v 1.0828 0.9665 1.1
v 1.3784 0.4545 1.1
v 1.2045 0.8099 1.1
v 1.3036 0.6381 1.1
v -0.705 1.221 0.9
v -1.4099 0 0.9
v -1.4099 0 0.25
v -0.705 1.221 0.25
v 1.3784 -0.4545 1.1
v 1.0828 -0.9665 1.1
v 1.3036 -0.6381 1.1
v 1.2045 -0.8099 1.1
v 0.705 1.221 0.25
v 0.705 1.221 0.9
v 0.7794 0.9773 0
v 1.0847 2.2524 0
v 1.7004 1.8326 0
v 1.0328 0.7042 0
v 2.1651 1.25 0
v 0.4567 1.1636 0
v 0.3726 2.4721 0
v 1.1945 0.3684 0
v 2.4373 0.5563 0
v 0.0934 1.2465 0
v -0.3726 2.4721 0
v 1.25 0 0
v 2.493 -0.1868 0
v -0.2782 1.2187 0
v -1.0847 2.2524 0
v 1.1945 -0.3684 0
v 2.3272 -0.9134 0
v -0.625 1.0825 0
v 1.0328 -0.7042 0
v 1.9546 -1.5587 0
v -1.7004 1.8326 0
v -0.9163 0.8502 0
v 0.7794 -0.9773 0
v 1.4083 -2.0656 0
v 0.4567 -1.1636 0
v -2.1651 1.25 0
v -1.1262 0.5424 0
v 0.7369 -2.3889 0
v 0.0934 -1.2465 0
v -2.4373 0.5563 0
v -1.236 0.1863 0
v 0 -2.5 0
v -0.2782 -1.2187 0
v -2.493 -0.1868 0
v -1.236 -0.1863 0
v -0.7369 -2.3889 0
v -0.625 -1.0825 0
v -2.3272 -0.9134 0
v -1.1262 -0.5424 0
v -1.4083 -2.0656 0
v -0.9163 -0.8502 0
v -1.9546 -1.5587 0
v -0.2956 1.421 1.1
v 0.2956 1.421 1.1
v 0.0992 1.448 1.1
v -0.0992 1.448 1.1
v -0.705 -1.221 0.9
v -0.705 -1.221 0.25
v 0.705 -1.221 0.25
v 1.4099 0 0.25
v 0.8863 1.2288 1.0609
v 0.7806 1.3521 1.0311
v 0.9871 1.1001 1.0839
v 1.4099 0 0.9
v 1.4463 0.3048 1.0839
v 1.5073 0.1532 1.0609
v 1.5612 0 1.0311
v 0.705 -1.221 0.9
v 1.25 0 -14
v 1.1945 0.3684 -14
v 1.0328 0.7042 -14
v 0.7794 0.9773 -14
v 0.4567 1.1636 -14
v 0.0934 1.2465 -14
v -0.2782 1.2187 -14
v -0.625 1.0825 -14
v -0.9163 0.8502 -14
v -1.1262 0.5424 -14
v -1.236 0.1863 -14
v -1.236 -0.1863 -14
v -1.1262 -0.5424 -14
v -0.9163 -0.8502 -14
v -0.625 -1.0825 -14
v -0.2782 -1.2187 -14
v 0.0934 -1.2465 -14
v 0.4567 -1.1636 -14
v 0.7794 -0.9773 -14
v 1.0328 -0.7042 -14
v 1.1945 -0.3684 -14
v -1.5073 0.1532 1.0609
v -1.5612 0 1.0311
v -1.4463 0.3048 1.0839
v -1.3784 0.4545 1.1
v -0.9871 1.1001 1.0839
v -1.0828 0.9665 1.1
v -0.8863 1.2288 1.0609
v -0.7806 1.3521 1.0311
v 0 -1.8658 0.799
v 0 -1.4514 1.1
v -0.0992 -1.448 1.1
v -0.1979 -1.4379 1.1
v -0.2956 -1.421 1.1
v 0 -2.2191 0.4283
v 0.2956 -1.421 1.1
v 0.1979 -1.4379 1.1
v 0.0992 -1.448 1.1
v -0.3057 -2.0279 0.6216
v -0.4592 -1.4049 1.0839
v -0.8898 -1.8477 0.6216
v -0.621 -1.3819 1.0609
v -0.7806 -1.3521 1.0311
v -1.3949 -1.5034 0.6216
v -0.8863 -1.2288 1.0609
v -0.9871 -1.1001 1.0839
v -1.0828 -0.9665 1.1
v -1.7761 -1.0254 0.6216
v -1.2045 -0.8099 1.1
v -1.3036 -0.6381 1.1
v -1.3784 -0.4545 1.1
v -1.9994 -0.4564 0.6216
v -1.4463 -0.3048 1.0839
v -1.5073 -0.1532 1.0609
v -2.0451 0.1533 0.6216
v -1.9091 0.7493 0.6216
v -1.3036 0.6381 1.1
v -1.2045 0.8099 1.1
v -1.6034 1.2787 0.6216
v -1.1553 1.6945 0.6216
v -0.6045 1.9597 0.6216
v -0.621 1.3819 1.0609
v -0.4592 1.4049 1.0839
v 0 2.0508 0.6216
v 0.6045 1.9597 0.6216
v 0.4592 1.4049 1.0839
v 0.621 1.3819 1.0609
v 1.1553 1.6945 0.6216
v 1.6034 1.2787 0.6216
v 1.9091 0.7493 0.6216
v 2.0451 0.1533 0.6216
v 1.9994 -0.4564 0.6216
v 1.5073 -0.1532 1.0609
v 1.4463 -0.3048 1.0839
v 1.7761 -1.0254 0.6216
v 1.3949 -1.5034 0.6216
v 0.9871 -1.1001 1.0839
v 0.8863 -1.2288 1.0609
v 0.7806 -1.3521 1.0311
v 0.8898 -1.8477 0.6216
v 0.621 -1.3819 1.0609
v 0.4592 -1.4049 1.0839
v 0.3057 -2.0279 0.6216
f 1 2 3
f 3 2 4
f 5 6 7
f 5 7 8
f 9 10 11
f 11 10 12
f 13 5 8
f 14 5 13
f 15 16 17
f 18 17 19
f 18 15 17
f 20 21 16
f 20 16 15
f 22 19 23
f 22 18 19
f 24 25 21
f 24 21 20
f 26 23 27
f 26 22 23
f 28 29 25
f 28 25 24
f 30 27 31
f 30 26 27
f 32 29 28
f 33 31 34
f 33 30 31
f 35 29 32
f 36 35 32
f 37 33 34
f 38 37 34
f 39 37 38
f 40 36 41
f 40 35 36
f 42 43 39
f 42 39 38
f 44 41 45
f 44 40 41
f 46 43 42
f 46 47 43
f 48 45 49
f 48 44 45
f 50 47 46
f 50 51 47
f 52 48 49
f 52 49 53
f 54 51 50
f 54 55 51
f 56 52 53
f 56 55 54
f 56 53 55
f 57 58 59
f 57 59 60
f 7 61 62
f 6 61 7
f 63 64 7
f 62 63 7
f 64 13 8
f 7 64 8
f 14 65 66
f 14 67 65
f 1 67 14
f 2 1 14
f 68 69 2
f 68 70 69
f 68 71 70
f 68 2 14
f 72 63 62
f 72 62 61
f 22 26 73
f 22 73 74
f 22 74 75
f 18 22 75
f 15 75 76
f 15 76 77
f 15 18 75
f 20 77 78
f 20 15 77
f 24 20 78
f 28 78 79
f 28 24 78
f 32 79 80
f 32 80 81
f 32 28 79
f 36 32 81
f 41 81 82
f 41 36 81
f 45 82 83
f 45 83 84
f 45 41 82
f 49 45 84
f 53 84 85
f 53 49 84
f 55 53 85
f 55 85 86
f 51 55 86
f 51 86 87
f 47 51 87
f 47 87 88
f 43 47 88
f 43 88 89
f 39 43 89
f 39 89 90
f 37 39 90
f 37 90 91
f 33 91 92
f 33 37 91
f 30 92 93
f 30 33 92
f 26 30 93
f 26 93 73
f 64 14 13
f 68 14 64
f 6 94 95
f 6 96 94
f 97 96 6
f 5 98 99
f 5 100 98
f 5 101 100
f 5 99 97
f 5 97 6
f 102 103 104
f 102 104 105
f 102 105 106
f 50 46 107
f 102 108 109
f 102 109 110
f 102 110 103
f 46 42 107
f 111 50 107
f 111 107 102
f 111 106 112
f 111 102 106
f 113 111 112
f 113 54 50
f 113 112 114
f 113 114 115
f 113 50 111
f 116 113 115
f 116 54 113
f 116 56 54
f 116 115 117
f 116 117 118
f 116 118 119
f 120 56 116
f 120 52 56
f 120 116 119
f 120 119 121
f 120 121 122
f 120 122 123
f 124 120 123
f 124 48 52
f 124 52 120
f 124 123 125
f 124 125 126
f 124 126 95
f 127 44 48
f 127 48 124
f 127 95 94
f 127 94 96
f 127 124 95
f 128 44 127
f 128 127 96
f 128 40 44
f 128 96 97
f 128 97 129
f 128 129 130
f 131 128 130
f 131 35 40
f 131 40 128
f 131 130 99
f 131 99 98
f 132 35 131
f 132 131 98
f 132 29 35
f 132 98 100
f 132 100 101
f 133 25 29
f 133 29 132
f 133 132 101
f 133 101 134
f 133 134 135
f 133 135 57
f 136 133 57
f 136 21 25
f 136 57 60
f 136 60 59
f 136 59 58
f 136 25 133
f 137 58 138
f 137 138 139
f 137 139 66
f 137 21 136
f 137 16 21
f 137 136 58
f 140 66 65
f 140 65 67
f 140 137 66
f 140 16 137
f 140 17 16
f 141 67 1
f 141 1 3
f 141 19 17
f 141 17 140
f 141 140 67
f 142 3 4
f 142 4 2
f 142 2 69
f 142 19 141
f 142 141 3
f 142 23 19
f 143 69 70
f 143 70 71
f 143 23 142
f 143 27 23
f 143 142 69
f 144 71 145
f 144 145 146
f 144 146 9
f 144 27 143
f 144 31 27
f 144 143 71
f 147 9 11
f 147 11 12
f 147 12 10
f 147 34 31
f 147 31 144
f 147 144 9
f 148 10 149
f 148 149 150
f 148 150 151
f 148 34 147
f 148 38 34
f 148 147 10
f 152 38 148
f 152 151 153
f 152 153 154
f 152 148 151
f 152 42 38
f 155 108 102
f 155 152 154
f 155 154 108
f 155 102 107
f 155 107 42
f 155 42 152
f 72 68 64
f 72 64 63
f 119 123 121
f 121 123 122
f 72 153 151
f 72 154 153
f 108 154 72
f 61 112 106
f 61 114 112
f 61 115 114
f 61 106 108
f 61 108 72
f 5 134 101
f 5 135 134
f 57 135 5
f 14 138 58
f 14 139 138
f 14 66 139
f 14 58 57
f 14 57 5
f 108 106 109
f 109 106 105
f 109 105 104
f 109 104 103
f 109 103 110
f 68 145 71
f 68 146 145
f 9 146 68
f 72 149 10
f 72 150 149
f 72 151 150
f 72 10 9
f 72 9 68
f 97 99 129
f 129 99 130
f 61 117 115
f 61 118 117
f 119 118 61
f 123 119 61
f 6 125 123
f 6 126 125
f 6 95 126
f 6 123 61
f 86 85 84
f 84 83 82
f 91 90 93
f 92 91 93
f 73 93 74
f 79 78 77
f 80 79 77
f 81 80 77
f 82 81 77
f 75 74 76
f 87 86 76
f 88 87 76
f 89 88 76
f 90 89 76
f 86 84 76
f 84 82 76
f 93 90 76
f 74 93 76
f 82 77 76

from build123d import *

# Parameters (mm, degrees)
SKETCH1_R               = 1.25
BOSS_EXTRUDE1_DEPTH     = 14
CUT_EXTRUDE1_DEPTH      = 1.25
CUT_EXTRUDE2_DEPTH      = 15.439529078
CUT_EXTRUDE2_DEPTH_BACK = 15.439529078
SKETCH6_W               = 1.249656436
SKETCH6_H               = 4.384153796
CHAMFER2_SIZE           = 0.2


with BuildPart() as part:
    # Sketch1 → Boss-Extrude1 (new body)
    with BuildSketch(Plane.XY):
        Circle(SKETCH1_R)
    extrude(amount=-BOSS_EXTRUDE1_DEPTH)

    # Sketch3 → Revolve1 (revolve)
    with BuildSketch(Plane(origin=(0, 0, 0), x_dir=(0, 0, -1), z_dir=(1, 0, 0)), mode=Mode.PRIVATE) as revolve1_sk:
        with BuildLine():
            ThreePointArc((-1.5, 0), (-1.096229956, 1.457737974), (0, 2.5))
            Line((0, 2.5), (0, 0))
            Line((0, 0), (-1.5, 0))
        make_face()
    revolve(revolve1_sk.sketch.rotate(Axis((0, 0, 1.5), (0, 0, -1)), 180), axis=Axis((0, 0, 1.5), (0, 0, -1)))

    # Sketch5 → Cut-Extrude1 (cut)
    with BuildSketch(Plane(origin=(0, 0, 1.5), x_dir=(-1, 0, 0), z_dir=(0, 0, -1))):
        Polygon((-1.409901945, 0), (-0.704950973, -1.221010901), (0.704950973, -1.221010901), (1.409901945, 0), (0.704950973, 1.221010901), (-0.704950973, 1.221010901), align=None)
    extrude(amount=CUT_EXTRUDE1_DEPTH, mode=Mode.SUBTRACT)

    # Sketch6 → Cut-Extrude2 (cut, two sides: drawn at the far end of the back side and taken through both)
    with BuildSketch(Plane(origin=(0, 0, 0), x_dir=(0, 0, -1), z_dir=(1, 0, 0)).offset(-CUT_EXTRUDE2_DEPTH_BACK)):
        with Locations((-1.724828218, 0.205450463)):
            Rectangle(SKETCH6_W, SKETCH6_H)
    extrude(amount=CUT_EXTRUDE2_DEPTH + CUT_EXTRUDE2_DEPTH_BACK, mode=Mode.SUBTRACT)

    # Chamfer2
    # the kernel refuses this chamfer: 0.2 mm, written as the material it takes off along each edge
    with BuildSketch(Plane(origin=(1.21928757, 1.221010901, 1.1), x_dir=(1.0390370186618431e-14, 0.9996219169112966, 0.02749587661058733), z_dir=(-1, 0, 0))) as chamfer2_piece_1_section:
        Polygon((CHAMFER2_SIZE * 0.999621916911, CHAMFER2_SIZE * 0.0274958766106), (-CHAMFER2_SIZE * 0.0274958766106, CHAMFER2_SIZE * 0.999621916911), (0, 0), align=None)
    chamfer2_piece_1 = extrude(amount=2.43857514, mode=Mode.PRIVATE)
    chamfer2_piece_1 = split(chamfer2_piece_1, bisect_by=Plane(origin=(0.501104512, 1.574083329, 1.032865614), z_dir=(-0.8660254037844416, -0.49999999999999495, 0)), keep=Keep.TOP, mode=Mode.PRIVATE)
    chamfer2_piece_1 = split(chamfer2_piece_1, bisect_by=Plane(origin=(-0.501104512, 1.574083329, 1.032865614), z_dir=(0.8660254037844347, -0.500000000000007, 0)), keep=Keep.TOP, mode=Mode.PRIVATE)
    add(chamfer2_piece_1, mode=Mode.SUBTRACT)
    with BuildSketch(Plane(origin=(1.667070244, -0.44542856, 1.1), x_dir=(0.8656979742248833, 0.4998109584556433, 0.027495876610586282), z_dir=(-0.49999999999999495, 0.8660254037844416, 0))) as chamfer2_piece_2_section:
        Polygon((CHAMFER2_SIZE * 0.999621916911, CHAMFER2_SIZE * 0.0274958766106), (-CHAMFER2_SIZE * 0.0274958766106, CHAMFER2_SIZE * 0.999621916911), (0, 0), align=None)
    chamfer2_piece_2 = extrude(amount=2.43857514, mode=Mode.PRIVATE)
    chamfer2_piece_2 = split(chamfer2_piece_2, bisect_by=Plane(origin=(1.613748406, 0.353072427, 1.032865614), z_dir=(-0.8660254037844382, 0.500000000000001, 0)), keep=Keep.TOP, mode=Mode.PRIVATE)
    chamfer2_piece_2 = split(chamfer2_piece_2, bisect_by=Plane(origin=(1.112643894, 1.221010901, 1.032865614), z_dir=(0, -1, 0)), keep=Keep.TOP, mode=Mode.PRIVATE)
    add(chamfer2_piece_2, mode=Mode.SUBTRACT)
    with BuildSketch(Plane(origin=(0.447782674, -1.666439461, 1.1), x_dir=(0.8656979742248797, -0.4998109584556493, 0.02749587661058626), z_dir=(0.500000000000001, 0.8660254037844382, 0))) as chamfer2_piece_3_section:
        Polygon((CHAMFER2_SIZE * 0.999621916911, CHAMFER2_SIZE * 0.0274958766106), (-CHAMFER2_SIZE * 0.0274958766106, CHAMFER2_SIZE * 0.999621916911), (0, 0), align=None)
    chamfer2_piece_3 = extrude(amount=2.43857514, mode=Mode.PRIVATE)
    chamfer2_piece_3 = split(chamfer2_piece_3, bisect_by=Plane(origin=(1.112643894, -1.221010901, 1.032865614), z_dir=(0, 1, 0)), keep=Keep.TOP, mode=Mode.PRIVATE)
    chamfer2_piece_3 = split(chamfer2_piece_3, bisect_by=Plane(origin=(1.613748406, -0.353072427, 1.032865614), z_dir=(-0.8660254037844416, -0.49999999999999495, 0)), keep=Keep.TOP, mode=Mode.PRIVATE)
    add(chamfer2_piece_3, mode=Mode.SUBTRACT)
    with BuildSketch(Plane(origin=(-1.21928757, -1.221010901, 1.1), x_dir=(-3.30602687756041e-15, -0.9996219169112968, 0.027495876610586285), z_dir=(1, 0, 0))) as chamfer2_piece_4_section:
        Polygon((CHAMFER2_SIZE * 0.999621916911, CHAMFER2_SIZE * 0.0274958766106), (-CHAMFER2_SIZE * 0.0274958766106, CHAMFER2_SIZE * 0.999621916911), (0, 0), align=None)
    chamfer2_piece_4 = extrude(amount=2.43857514, mode=Mode.PRIVATE)
    chamfer2_piece_4 = split(chamfer2_piece_4, bisect_by=Plane(origin=(-0.501104512, -1.574083329, 1.032865614), z_dir=(0.8660254037844417, 0.49999999999999484, 0)), keep=Keep.TOP, mode=Mode.PRIVATE)
    chamfer2_piece_4 = split(chamfer2_piece_4, bisect_by=Plane(origin=(0.501104512, -1.574083329, 1.032865614), z_dir=(-0.8660254037844382, 0.500000000000001, 0)), keep=Keep.TOP, mode=Mode.PRIVATE)
    add(chamfer2_piece_4, mode=Mode.SUBTRACT)
    with BuildSketch(Plane(origin=(-1.667070244, 0.44542856, 1.1), x_dir=(-0.8656979742248834, -0.4998109584556432, 0.027495876610586265), z_dir=(0.49999999999999484, -0.8660254037844417, 0))) as chamfer2_piece_5_section:
        Polygon((CHAMFER2_SIZE * 0.999621916911, CHAMFER2_SIZE * 0.0274958766106), (-CHAMFER2_SIZE * 0.0274958766106, CHAMFER2_SIZE * 0.999621916911), (0, 0), align=None)
    chamfer2_piece_5 = extrude(amount=2.43857514, mode=Mode.PRIVATE)
    chamfer2_piece_5 = split(chamfer2_piece_5, bisect_by=Plane(origin=(-1.112643894, -1.221010901, 1.032865614), z_dir=(0, 1, 0)), keep=Keep.TOP, mode=Mode.PRIVATE)
    chamfer2_piece_5 = split(chamfer2_piece_5, bisect_by=Plane(origin=(-1.613748406, -0.353072427, 1.032865614), z_dir=(0.8660254037844347, -0.500000000000007, 0)), keep=Keep.TOP, mode=Mode.PRIVATE)
    add(chamfer2_piece_5, mode=Mode.SUBTRACT)
    with BuildSketch(Plane(origin=(-0.447782674, 1.666439461, 1.1), x_dir=(-0.8656979742248764, 0.4998109584556554, 0.027495876610586265), z_dir=(-0.500000000000007, -0.8660254037844347, 0))) as chamfer2_piece_6_section:
        Polygon((CHAMFER2_SIZE * 0.999621916911, CHAMFER2_SIZE * 0.0274958766106), (-CHAMFER2_SIZE * 0.0274958766106, CHAMFER2_SIZE * 0.999621916911), (0, 0), align=None)
    chamfer2_piece_6 = extrude(amount=2.43857514, mode=Mode.PRIVATE)
    chamfer2_piece_6 = split(chamfer2_piece_6, bisect_by=Plane(origin=(-1.112643894, 1.221010901, 1.032865614), z_dir=(0, -1, 0)), keep=Keep.TOP, mode=Mode.PRIVATE)
    chamfer2_piece_6 = split(chamfer2_piece_6, bisect_by=Plane(origin=(-1.613748406, 0.353072427, 1.032865614), z_dir=(0.8660254037844417, 0.49999999999999484, 0)), keep=Keep.TOP, mode=Mode.PRIVATE)
    add(chamfer2_piece_6, mode=Mode.SUBTRACT)
    with BuildSketch(Plane(origin=(1.667070244, -0.44542856, 1.1), x_dir=(0.8656979742248833, 0.4998109584556433, 0.027495876610586282), z_dir=(-0.49999999999999495, 0.8660254037844416, 0))) as chamfer2_piece_7a_section:
        Polygon((CHAMFER2_SIZE * 0.999621916911, CHAMFER2_SIZE * 0.0274958766106), (-CHAMFER2_SIZE * 0.0274958766106, CHAMFER2_SIZE * 0.999621916911), (0, 0), align=None)
    chamfer2_piece_7a = extrude(amount=2.43857514, mode=Mode.PRIVATE)
    chamfer2_piece_7a = split(chamfer2_piece_7a, bisect_by=Plane(origin=(0.645691333, 1.221010901, 1.035460513), z_dir=(0, 1, 0)), keep=Keep.TOP, mode=Mode.PRIVATE)
    with BuildSketch(Plane(origin=(1.21928757, 1.221010901, 1.1), x_dir=(1.0390370186618431e-14, 0.9996219169112966, 0.02749587661058733), z_dir=(-1, 0, 0))) as chamfer2_piece_7b_section:
        Polygon((CHAMFER2_SIZE * 0.999621916911, CHAMFER2_SIZE * 0.0274958766106), (-CHAMFER2_SIZE * 0.0274958766106, CHAMFER2_SIZE * 0.999621916911), (0, 0), align=None)
    chamfer2_piece_7b = extrude(amount=2.43857514, mode=Mode.PRIVATE)
    chamfer2_piece_7b = split(chamfer2_piece_7b, bisect_by=Plane(origin=(0.734580793, 1.169690548, 1.035460513), z_dir=(0.8660254037844416, 0.49999999999999495, 0)), keep=Keep.TOP, mode=Mode.PRIVATE)
    chamfer2_piece_7 = chamfer2_piece_7a & chamfer2_piece_7b
    add(chamfer2_piece_7, mode=Mode.SUBTRACT)
    with BuildSketch(Plane(origin=(1.21928757, 1.221010901, 1.1), x_dir=(1.0390370186618431e-14, 0.9996219169112966, 0.02749587661058733), z_dir=(-1, 0, 0))) as chamfer2_piece_8a_section:
        Polygon((CHAMFER2_SIZE * 0.999621916911, CHAMFER2_SIZE * 0.0274958766106), (-CHAMFER2_SIZE * 0.0274958766106, CHAMFER2_SIZE * 0.999621916911), (0, 0), align=None)
    chamfer2_piece_8a = extrude(amount=2.43857514, mode=Mode.PRIVATE)
    chamfer2_piece_8a = split(chamfer2_piece_8a, bisect_by=Plane(origin=(-0.734580793, 1.169690548, 1.035460513), z_dir=(-0.8660254037844347, 0.500000000000007, 0)), keep=Keep.TOP, mode=Mode.PRIVATE)
    with BuildSketch(Plane(origin=(-0.447782674, 1.666439461, 1.1), x_dir=(-0.8656979742248764, 0.4998109584556554, 0.027495876610586265), z_dir=(-0.500000000000007, -0.8660254037844347, 0))) as chamfer2_piece_8b_section:
        Polygon((CHAMFER2_SIZE * 0.999621916911, CHAMFER2_SIZE * 0.0274958766106), (-CHAMFER2_SIZE * 0.0274958766106, CHAMFER2_SIZE * 0.999621916911), (0, 0), align=None)
    chamfer2_piece_8b = extrude(amount=2.43857514, mode=Mode.PRIVATE)
    chamfer2_piece_8b = split(chamfer2_piece_8b, bisect_by=Plane(origin=(-0.645691333, 1.221010901, 1.035460513), z_dir=(0, 1, 0)), keep=Keep.TOP, mode=Mode.PRIVATE)
    chamfer2_piece_8 = chamfer2_piece_8a & chamfer2_piece_8b
    add(chamfer2_piece_8, mode=Mode.SUBTRACT)
    with BuildSketch(Plane(origin=(0.447782674, -1.666439461, 1.1), x_dir=(0.8656979742248797, -0.4998109584556493, 0.02749587661058626), z_dir=(0.500000000000001, 0.8660254037844382, 0))) as chamfer2_piece_9a_section:
        Polygon((CHAMFER2_SIZE * 0.999621916911, CHAMFER2_SIZE * 0.0274958766106), (-CHAMFER2_SIZE * 0.0274958766106, CHAMFER2_SIZE * 0.999621916911), (0, 0), align=None)
    chamfer2_piece_9a = extrude(amount=2.43857514, mode=Mode.PRIVATE)
    chamfer2_piece_9a = split(chamfer2_piece_9a, bisect_by=Plane(origin=(1.380272125, 0.051320354, 1.035460513), z_dir=(0.8660254037844416, 0.49999999999999495, 0)), keep=Keep.TOP, mode=Mode.PRIVATE)
    with BuildSketch(Plane(origin=(1.667070244, -0.44542856, 1.1), x_dir=(0.8656979742248833, 0.4998109584556433, 0.027495876610586282), z_dir=(-0.49999999999999495, 0.8660254037844416, 0))) as chamfer2_piece_9b_section:
        Polygon((CHAMFER2_SIZE * 0.999621916911, CHAMFER2_SIZE * 0.0274958766106), (-CHAMFER2_SIZE * 0.0274958766106, CHAMFER2_SIZE * 0.999621916911), (0, 0), align=None)
    chamfer2_piece_9b = extrude(amount=2.43857514, mode=Mode.PRIVATE)
    chamfer2_piece_9b = split(chamfer2_piece_9b, bisect_by=Plane(origin=(1.380272125, -0.051320354, 1.035460513), z_dir=(0.8660254037844382, -0.500000000000001, 0)), keep=Keep.TOP, mode=Mode.PRIVATE)
    chamfer2_piece_9 = chamfer2_piece_9a & chamfer2_piece_9b
    add(chamfer2_piece_9, mode=Mode.SUBTRACT)
    with BuildSketch(Plane(origin=(-1.21928757, -1.221010901, 1.1), x_dir=(-3.30602687756041e-15, -0.9996219169112968, 0.027495876610586285), z_dir=(1, 0, 0))) as chamfer2_piece_10a_section:
        Polygon((CHAMFER2_SIZE * 0.999621916911, CHAMFER2_SIZE * 0.0274958766106), (-CHAMFER2_SIZE * 0.0274958766106, CHAMFER2_SIZE * 0.999621916911), (0, 0), align=None)
    chamfer2_piece_10a = extrude(amount=2.43857514, mode=Mode.PRIVATE)
    chamfer2_piece_10a = split(chamfer2_piece_10a, bisect_by=Plane(origin=(0.734580793, -1.169690548, 1.035460513), z_dir=(0.8660254037844382, -0.500000000000001, 0)), keep=Keep.TOP, mode=Mode.PRIVATE)
    with BuildSketch(Plane(origin=(0.447782674, -1.666439461, 1.1), x_dir=(0.8656979742248797, -0.4998109584556493, 0.02749587661058626), z_dir=(0.500000000000001, 0.8660254037844382, 0))) as chamfer2_piece_10b_section:
        Polygon((CHAMFER2_SIZE * 0.999621916911, CHAMFER2_SIZE * 0.0274958766106), (-CHAMFER2_SIZE * 0.0274958766106, CHAMFER2_SIZE * 0.999621916911), (0, 0), align=None)
    chamfer2_piece_10b = extrude(amount=2.43857514, mode=Mode.PRIVATE)
    chamfer2_piece_10b = split(chamfer2_piece_10b, bisect_by=Plane(origin=(0.645691333, -1.221010901, 1.035460513), z_dir=(0, -1, 0)), keep=Keep.TOP, mode=Mode.PRIVATE)
    chamfer2_piece_10 = chamfer2_piece_10a & chamfer2_piece_10b
    add(chamfer2_piece_10, mode=Mode.SUBTRACT)
    with BuildSketch(Plane(origin=(-1.21928757, -1.221010901, 1.1), x_dir=(-3.30602687756041e-15, -0.9996219169112968, 0.027495876610586285), z_dir=(1, 0, 0))) as chamfer2_piece_11a_section:
        Polygon((CHAMFER2_SIZE * 0.999621916911, CHAMFER2_SIZE * 0.0274958766106), (-CHAMFER2_SIZE * 0.0274958766106, CHAMFER2_SIZE * 0.999621916911), (0, 0), align=None)
    chamfer2_piece_11a = extrude(amount=2.43857514, mode=Mode.PRIVATE)
    chamfer2_piece_11a = split(chamfer2_piece_11a, bisect_by=Plane(origin=(-0.734580793, -1.169690548, 1.035460513), z_dir=(-0.8660254037844417, -0.49999999999999484, 0)), keep=Keep.TOP, mode=Mode.PRIVATE)
    with BuildSketch(Plane(origin=(-1.667070244, 0.44542856, 1.1), x_dir=(-0.8656979742248834, -0.4998109584556432, 0.027495876610586265), z_dir=(0.49999999999999484, -0.8660254037844417, 0))) as chamfer2_piece_11b_section:
        Polygon((CHAMFER2_SIZE * 0.999621916911, CHAMFER2_SIZE * 0.0274958766106), (-CHAMFER2_SIZE * 0.0274958766106, CHAMFER2_SIZE * 0.999621916911), (0, 0), align=None)
    chamfer2_piece_11b = extrude(amount=2.43857514, mode=Mode.PRIVATE)
    chamfer2_piece_11b = split(chamfer2_piece_11b, bisect_by=Plane(origin=(-0.645691333, -1.221010901, 1.035460513), z_dir=(0, -1, 0)), keep=Keep.TOP, mode=Mode.PRIVATE)
    chamfer2_piece_11 = chamfer2_piece_11a & chamfer2_piece_11b
    add(chamfer2_piece_11, mode=Mode.SUBTRACT)
    with BuildSketch(Plane(origin=(-0.447782674, 1.666439461, 1.1), x_dir=(-0.8656979742248764, 0.4998109584556554, 0.027495876610586265), z_dir=(-0.500000000000007, -0.8660254037844347, 0))) as chamfer2_piece_12a_section:
        Polygon((CHAMFER2_SIZE * 0.999621916911, CHAMFER2_SIZE * 0.0274958766106), (-CHAMFER2_SIZE * 0.0274958766106, CHAMFER2_SIZE * 0.999621916911), (0, 0), align=None)
    chamfer2_piece_12a = extrude(amount=2.43857514, mode=Mode.PRIVATE)
    chamfer2_piece_12a = split(chamfer2_piece_12a, bisect_by=Plane(origin=(-1.380272125, -0.051320354, 1.035460513), z_dir=(-0.8660254037844417, -0.49999999999999484, 0)), keep=Keep.TOP, mode=Mode.PRIVATE)
    with BuildSketch(Plane(origin=(-1.667070244, 0.44542856, 1.1), x_dir=(-0.8656979742248834, -0.4998109584556432, 0.027495876610586265), z_dir=(0.49999999999999484, -0.8660254037844417, 0))) as chamfer2_piece_12b_section:
        Polygon((CHAMFER2_SIZE * 0.999621916911, CHAMFER2_SIZE * 0.0274958766106), (-CHAMFER2_SIZE * 0.0274958766106, CHAMFER2_SIZE * 0.999621916911), (0, 0), align=None)
    chamfer2_piece_12b = extrude(amount=2.43857514, mode=Mode.PRIVATE)
    chamfer2_piece_12b = split(chamfer2_piece_12b, bisect_by=Plane(origin=(-1.380272125, 0.051320354, 1.035460513), z_dir=(-0.8660254037844347, 0.500000000000007, 0)), keep=Keep.TOP, mode=Mode.PRIVATE)
    chamfer2_piece_12 = chamfer2_piece_12a & chamfer2_piece_12b
    add(chamfer2_piece_12, mode=Mode.SUBTRACT)


solid = part.part
